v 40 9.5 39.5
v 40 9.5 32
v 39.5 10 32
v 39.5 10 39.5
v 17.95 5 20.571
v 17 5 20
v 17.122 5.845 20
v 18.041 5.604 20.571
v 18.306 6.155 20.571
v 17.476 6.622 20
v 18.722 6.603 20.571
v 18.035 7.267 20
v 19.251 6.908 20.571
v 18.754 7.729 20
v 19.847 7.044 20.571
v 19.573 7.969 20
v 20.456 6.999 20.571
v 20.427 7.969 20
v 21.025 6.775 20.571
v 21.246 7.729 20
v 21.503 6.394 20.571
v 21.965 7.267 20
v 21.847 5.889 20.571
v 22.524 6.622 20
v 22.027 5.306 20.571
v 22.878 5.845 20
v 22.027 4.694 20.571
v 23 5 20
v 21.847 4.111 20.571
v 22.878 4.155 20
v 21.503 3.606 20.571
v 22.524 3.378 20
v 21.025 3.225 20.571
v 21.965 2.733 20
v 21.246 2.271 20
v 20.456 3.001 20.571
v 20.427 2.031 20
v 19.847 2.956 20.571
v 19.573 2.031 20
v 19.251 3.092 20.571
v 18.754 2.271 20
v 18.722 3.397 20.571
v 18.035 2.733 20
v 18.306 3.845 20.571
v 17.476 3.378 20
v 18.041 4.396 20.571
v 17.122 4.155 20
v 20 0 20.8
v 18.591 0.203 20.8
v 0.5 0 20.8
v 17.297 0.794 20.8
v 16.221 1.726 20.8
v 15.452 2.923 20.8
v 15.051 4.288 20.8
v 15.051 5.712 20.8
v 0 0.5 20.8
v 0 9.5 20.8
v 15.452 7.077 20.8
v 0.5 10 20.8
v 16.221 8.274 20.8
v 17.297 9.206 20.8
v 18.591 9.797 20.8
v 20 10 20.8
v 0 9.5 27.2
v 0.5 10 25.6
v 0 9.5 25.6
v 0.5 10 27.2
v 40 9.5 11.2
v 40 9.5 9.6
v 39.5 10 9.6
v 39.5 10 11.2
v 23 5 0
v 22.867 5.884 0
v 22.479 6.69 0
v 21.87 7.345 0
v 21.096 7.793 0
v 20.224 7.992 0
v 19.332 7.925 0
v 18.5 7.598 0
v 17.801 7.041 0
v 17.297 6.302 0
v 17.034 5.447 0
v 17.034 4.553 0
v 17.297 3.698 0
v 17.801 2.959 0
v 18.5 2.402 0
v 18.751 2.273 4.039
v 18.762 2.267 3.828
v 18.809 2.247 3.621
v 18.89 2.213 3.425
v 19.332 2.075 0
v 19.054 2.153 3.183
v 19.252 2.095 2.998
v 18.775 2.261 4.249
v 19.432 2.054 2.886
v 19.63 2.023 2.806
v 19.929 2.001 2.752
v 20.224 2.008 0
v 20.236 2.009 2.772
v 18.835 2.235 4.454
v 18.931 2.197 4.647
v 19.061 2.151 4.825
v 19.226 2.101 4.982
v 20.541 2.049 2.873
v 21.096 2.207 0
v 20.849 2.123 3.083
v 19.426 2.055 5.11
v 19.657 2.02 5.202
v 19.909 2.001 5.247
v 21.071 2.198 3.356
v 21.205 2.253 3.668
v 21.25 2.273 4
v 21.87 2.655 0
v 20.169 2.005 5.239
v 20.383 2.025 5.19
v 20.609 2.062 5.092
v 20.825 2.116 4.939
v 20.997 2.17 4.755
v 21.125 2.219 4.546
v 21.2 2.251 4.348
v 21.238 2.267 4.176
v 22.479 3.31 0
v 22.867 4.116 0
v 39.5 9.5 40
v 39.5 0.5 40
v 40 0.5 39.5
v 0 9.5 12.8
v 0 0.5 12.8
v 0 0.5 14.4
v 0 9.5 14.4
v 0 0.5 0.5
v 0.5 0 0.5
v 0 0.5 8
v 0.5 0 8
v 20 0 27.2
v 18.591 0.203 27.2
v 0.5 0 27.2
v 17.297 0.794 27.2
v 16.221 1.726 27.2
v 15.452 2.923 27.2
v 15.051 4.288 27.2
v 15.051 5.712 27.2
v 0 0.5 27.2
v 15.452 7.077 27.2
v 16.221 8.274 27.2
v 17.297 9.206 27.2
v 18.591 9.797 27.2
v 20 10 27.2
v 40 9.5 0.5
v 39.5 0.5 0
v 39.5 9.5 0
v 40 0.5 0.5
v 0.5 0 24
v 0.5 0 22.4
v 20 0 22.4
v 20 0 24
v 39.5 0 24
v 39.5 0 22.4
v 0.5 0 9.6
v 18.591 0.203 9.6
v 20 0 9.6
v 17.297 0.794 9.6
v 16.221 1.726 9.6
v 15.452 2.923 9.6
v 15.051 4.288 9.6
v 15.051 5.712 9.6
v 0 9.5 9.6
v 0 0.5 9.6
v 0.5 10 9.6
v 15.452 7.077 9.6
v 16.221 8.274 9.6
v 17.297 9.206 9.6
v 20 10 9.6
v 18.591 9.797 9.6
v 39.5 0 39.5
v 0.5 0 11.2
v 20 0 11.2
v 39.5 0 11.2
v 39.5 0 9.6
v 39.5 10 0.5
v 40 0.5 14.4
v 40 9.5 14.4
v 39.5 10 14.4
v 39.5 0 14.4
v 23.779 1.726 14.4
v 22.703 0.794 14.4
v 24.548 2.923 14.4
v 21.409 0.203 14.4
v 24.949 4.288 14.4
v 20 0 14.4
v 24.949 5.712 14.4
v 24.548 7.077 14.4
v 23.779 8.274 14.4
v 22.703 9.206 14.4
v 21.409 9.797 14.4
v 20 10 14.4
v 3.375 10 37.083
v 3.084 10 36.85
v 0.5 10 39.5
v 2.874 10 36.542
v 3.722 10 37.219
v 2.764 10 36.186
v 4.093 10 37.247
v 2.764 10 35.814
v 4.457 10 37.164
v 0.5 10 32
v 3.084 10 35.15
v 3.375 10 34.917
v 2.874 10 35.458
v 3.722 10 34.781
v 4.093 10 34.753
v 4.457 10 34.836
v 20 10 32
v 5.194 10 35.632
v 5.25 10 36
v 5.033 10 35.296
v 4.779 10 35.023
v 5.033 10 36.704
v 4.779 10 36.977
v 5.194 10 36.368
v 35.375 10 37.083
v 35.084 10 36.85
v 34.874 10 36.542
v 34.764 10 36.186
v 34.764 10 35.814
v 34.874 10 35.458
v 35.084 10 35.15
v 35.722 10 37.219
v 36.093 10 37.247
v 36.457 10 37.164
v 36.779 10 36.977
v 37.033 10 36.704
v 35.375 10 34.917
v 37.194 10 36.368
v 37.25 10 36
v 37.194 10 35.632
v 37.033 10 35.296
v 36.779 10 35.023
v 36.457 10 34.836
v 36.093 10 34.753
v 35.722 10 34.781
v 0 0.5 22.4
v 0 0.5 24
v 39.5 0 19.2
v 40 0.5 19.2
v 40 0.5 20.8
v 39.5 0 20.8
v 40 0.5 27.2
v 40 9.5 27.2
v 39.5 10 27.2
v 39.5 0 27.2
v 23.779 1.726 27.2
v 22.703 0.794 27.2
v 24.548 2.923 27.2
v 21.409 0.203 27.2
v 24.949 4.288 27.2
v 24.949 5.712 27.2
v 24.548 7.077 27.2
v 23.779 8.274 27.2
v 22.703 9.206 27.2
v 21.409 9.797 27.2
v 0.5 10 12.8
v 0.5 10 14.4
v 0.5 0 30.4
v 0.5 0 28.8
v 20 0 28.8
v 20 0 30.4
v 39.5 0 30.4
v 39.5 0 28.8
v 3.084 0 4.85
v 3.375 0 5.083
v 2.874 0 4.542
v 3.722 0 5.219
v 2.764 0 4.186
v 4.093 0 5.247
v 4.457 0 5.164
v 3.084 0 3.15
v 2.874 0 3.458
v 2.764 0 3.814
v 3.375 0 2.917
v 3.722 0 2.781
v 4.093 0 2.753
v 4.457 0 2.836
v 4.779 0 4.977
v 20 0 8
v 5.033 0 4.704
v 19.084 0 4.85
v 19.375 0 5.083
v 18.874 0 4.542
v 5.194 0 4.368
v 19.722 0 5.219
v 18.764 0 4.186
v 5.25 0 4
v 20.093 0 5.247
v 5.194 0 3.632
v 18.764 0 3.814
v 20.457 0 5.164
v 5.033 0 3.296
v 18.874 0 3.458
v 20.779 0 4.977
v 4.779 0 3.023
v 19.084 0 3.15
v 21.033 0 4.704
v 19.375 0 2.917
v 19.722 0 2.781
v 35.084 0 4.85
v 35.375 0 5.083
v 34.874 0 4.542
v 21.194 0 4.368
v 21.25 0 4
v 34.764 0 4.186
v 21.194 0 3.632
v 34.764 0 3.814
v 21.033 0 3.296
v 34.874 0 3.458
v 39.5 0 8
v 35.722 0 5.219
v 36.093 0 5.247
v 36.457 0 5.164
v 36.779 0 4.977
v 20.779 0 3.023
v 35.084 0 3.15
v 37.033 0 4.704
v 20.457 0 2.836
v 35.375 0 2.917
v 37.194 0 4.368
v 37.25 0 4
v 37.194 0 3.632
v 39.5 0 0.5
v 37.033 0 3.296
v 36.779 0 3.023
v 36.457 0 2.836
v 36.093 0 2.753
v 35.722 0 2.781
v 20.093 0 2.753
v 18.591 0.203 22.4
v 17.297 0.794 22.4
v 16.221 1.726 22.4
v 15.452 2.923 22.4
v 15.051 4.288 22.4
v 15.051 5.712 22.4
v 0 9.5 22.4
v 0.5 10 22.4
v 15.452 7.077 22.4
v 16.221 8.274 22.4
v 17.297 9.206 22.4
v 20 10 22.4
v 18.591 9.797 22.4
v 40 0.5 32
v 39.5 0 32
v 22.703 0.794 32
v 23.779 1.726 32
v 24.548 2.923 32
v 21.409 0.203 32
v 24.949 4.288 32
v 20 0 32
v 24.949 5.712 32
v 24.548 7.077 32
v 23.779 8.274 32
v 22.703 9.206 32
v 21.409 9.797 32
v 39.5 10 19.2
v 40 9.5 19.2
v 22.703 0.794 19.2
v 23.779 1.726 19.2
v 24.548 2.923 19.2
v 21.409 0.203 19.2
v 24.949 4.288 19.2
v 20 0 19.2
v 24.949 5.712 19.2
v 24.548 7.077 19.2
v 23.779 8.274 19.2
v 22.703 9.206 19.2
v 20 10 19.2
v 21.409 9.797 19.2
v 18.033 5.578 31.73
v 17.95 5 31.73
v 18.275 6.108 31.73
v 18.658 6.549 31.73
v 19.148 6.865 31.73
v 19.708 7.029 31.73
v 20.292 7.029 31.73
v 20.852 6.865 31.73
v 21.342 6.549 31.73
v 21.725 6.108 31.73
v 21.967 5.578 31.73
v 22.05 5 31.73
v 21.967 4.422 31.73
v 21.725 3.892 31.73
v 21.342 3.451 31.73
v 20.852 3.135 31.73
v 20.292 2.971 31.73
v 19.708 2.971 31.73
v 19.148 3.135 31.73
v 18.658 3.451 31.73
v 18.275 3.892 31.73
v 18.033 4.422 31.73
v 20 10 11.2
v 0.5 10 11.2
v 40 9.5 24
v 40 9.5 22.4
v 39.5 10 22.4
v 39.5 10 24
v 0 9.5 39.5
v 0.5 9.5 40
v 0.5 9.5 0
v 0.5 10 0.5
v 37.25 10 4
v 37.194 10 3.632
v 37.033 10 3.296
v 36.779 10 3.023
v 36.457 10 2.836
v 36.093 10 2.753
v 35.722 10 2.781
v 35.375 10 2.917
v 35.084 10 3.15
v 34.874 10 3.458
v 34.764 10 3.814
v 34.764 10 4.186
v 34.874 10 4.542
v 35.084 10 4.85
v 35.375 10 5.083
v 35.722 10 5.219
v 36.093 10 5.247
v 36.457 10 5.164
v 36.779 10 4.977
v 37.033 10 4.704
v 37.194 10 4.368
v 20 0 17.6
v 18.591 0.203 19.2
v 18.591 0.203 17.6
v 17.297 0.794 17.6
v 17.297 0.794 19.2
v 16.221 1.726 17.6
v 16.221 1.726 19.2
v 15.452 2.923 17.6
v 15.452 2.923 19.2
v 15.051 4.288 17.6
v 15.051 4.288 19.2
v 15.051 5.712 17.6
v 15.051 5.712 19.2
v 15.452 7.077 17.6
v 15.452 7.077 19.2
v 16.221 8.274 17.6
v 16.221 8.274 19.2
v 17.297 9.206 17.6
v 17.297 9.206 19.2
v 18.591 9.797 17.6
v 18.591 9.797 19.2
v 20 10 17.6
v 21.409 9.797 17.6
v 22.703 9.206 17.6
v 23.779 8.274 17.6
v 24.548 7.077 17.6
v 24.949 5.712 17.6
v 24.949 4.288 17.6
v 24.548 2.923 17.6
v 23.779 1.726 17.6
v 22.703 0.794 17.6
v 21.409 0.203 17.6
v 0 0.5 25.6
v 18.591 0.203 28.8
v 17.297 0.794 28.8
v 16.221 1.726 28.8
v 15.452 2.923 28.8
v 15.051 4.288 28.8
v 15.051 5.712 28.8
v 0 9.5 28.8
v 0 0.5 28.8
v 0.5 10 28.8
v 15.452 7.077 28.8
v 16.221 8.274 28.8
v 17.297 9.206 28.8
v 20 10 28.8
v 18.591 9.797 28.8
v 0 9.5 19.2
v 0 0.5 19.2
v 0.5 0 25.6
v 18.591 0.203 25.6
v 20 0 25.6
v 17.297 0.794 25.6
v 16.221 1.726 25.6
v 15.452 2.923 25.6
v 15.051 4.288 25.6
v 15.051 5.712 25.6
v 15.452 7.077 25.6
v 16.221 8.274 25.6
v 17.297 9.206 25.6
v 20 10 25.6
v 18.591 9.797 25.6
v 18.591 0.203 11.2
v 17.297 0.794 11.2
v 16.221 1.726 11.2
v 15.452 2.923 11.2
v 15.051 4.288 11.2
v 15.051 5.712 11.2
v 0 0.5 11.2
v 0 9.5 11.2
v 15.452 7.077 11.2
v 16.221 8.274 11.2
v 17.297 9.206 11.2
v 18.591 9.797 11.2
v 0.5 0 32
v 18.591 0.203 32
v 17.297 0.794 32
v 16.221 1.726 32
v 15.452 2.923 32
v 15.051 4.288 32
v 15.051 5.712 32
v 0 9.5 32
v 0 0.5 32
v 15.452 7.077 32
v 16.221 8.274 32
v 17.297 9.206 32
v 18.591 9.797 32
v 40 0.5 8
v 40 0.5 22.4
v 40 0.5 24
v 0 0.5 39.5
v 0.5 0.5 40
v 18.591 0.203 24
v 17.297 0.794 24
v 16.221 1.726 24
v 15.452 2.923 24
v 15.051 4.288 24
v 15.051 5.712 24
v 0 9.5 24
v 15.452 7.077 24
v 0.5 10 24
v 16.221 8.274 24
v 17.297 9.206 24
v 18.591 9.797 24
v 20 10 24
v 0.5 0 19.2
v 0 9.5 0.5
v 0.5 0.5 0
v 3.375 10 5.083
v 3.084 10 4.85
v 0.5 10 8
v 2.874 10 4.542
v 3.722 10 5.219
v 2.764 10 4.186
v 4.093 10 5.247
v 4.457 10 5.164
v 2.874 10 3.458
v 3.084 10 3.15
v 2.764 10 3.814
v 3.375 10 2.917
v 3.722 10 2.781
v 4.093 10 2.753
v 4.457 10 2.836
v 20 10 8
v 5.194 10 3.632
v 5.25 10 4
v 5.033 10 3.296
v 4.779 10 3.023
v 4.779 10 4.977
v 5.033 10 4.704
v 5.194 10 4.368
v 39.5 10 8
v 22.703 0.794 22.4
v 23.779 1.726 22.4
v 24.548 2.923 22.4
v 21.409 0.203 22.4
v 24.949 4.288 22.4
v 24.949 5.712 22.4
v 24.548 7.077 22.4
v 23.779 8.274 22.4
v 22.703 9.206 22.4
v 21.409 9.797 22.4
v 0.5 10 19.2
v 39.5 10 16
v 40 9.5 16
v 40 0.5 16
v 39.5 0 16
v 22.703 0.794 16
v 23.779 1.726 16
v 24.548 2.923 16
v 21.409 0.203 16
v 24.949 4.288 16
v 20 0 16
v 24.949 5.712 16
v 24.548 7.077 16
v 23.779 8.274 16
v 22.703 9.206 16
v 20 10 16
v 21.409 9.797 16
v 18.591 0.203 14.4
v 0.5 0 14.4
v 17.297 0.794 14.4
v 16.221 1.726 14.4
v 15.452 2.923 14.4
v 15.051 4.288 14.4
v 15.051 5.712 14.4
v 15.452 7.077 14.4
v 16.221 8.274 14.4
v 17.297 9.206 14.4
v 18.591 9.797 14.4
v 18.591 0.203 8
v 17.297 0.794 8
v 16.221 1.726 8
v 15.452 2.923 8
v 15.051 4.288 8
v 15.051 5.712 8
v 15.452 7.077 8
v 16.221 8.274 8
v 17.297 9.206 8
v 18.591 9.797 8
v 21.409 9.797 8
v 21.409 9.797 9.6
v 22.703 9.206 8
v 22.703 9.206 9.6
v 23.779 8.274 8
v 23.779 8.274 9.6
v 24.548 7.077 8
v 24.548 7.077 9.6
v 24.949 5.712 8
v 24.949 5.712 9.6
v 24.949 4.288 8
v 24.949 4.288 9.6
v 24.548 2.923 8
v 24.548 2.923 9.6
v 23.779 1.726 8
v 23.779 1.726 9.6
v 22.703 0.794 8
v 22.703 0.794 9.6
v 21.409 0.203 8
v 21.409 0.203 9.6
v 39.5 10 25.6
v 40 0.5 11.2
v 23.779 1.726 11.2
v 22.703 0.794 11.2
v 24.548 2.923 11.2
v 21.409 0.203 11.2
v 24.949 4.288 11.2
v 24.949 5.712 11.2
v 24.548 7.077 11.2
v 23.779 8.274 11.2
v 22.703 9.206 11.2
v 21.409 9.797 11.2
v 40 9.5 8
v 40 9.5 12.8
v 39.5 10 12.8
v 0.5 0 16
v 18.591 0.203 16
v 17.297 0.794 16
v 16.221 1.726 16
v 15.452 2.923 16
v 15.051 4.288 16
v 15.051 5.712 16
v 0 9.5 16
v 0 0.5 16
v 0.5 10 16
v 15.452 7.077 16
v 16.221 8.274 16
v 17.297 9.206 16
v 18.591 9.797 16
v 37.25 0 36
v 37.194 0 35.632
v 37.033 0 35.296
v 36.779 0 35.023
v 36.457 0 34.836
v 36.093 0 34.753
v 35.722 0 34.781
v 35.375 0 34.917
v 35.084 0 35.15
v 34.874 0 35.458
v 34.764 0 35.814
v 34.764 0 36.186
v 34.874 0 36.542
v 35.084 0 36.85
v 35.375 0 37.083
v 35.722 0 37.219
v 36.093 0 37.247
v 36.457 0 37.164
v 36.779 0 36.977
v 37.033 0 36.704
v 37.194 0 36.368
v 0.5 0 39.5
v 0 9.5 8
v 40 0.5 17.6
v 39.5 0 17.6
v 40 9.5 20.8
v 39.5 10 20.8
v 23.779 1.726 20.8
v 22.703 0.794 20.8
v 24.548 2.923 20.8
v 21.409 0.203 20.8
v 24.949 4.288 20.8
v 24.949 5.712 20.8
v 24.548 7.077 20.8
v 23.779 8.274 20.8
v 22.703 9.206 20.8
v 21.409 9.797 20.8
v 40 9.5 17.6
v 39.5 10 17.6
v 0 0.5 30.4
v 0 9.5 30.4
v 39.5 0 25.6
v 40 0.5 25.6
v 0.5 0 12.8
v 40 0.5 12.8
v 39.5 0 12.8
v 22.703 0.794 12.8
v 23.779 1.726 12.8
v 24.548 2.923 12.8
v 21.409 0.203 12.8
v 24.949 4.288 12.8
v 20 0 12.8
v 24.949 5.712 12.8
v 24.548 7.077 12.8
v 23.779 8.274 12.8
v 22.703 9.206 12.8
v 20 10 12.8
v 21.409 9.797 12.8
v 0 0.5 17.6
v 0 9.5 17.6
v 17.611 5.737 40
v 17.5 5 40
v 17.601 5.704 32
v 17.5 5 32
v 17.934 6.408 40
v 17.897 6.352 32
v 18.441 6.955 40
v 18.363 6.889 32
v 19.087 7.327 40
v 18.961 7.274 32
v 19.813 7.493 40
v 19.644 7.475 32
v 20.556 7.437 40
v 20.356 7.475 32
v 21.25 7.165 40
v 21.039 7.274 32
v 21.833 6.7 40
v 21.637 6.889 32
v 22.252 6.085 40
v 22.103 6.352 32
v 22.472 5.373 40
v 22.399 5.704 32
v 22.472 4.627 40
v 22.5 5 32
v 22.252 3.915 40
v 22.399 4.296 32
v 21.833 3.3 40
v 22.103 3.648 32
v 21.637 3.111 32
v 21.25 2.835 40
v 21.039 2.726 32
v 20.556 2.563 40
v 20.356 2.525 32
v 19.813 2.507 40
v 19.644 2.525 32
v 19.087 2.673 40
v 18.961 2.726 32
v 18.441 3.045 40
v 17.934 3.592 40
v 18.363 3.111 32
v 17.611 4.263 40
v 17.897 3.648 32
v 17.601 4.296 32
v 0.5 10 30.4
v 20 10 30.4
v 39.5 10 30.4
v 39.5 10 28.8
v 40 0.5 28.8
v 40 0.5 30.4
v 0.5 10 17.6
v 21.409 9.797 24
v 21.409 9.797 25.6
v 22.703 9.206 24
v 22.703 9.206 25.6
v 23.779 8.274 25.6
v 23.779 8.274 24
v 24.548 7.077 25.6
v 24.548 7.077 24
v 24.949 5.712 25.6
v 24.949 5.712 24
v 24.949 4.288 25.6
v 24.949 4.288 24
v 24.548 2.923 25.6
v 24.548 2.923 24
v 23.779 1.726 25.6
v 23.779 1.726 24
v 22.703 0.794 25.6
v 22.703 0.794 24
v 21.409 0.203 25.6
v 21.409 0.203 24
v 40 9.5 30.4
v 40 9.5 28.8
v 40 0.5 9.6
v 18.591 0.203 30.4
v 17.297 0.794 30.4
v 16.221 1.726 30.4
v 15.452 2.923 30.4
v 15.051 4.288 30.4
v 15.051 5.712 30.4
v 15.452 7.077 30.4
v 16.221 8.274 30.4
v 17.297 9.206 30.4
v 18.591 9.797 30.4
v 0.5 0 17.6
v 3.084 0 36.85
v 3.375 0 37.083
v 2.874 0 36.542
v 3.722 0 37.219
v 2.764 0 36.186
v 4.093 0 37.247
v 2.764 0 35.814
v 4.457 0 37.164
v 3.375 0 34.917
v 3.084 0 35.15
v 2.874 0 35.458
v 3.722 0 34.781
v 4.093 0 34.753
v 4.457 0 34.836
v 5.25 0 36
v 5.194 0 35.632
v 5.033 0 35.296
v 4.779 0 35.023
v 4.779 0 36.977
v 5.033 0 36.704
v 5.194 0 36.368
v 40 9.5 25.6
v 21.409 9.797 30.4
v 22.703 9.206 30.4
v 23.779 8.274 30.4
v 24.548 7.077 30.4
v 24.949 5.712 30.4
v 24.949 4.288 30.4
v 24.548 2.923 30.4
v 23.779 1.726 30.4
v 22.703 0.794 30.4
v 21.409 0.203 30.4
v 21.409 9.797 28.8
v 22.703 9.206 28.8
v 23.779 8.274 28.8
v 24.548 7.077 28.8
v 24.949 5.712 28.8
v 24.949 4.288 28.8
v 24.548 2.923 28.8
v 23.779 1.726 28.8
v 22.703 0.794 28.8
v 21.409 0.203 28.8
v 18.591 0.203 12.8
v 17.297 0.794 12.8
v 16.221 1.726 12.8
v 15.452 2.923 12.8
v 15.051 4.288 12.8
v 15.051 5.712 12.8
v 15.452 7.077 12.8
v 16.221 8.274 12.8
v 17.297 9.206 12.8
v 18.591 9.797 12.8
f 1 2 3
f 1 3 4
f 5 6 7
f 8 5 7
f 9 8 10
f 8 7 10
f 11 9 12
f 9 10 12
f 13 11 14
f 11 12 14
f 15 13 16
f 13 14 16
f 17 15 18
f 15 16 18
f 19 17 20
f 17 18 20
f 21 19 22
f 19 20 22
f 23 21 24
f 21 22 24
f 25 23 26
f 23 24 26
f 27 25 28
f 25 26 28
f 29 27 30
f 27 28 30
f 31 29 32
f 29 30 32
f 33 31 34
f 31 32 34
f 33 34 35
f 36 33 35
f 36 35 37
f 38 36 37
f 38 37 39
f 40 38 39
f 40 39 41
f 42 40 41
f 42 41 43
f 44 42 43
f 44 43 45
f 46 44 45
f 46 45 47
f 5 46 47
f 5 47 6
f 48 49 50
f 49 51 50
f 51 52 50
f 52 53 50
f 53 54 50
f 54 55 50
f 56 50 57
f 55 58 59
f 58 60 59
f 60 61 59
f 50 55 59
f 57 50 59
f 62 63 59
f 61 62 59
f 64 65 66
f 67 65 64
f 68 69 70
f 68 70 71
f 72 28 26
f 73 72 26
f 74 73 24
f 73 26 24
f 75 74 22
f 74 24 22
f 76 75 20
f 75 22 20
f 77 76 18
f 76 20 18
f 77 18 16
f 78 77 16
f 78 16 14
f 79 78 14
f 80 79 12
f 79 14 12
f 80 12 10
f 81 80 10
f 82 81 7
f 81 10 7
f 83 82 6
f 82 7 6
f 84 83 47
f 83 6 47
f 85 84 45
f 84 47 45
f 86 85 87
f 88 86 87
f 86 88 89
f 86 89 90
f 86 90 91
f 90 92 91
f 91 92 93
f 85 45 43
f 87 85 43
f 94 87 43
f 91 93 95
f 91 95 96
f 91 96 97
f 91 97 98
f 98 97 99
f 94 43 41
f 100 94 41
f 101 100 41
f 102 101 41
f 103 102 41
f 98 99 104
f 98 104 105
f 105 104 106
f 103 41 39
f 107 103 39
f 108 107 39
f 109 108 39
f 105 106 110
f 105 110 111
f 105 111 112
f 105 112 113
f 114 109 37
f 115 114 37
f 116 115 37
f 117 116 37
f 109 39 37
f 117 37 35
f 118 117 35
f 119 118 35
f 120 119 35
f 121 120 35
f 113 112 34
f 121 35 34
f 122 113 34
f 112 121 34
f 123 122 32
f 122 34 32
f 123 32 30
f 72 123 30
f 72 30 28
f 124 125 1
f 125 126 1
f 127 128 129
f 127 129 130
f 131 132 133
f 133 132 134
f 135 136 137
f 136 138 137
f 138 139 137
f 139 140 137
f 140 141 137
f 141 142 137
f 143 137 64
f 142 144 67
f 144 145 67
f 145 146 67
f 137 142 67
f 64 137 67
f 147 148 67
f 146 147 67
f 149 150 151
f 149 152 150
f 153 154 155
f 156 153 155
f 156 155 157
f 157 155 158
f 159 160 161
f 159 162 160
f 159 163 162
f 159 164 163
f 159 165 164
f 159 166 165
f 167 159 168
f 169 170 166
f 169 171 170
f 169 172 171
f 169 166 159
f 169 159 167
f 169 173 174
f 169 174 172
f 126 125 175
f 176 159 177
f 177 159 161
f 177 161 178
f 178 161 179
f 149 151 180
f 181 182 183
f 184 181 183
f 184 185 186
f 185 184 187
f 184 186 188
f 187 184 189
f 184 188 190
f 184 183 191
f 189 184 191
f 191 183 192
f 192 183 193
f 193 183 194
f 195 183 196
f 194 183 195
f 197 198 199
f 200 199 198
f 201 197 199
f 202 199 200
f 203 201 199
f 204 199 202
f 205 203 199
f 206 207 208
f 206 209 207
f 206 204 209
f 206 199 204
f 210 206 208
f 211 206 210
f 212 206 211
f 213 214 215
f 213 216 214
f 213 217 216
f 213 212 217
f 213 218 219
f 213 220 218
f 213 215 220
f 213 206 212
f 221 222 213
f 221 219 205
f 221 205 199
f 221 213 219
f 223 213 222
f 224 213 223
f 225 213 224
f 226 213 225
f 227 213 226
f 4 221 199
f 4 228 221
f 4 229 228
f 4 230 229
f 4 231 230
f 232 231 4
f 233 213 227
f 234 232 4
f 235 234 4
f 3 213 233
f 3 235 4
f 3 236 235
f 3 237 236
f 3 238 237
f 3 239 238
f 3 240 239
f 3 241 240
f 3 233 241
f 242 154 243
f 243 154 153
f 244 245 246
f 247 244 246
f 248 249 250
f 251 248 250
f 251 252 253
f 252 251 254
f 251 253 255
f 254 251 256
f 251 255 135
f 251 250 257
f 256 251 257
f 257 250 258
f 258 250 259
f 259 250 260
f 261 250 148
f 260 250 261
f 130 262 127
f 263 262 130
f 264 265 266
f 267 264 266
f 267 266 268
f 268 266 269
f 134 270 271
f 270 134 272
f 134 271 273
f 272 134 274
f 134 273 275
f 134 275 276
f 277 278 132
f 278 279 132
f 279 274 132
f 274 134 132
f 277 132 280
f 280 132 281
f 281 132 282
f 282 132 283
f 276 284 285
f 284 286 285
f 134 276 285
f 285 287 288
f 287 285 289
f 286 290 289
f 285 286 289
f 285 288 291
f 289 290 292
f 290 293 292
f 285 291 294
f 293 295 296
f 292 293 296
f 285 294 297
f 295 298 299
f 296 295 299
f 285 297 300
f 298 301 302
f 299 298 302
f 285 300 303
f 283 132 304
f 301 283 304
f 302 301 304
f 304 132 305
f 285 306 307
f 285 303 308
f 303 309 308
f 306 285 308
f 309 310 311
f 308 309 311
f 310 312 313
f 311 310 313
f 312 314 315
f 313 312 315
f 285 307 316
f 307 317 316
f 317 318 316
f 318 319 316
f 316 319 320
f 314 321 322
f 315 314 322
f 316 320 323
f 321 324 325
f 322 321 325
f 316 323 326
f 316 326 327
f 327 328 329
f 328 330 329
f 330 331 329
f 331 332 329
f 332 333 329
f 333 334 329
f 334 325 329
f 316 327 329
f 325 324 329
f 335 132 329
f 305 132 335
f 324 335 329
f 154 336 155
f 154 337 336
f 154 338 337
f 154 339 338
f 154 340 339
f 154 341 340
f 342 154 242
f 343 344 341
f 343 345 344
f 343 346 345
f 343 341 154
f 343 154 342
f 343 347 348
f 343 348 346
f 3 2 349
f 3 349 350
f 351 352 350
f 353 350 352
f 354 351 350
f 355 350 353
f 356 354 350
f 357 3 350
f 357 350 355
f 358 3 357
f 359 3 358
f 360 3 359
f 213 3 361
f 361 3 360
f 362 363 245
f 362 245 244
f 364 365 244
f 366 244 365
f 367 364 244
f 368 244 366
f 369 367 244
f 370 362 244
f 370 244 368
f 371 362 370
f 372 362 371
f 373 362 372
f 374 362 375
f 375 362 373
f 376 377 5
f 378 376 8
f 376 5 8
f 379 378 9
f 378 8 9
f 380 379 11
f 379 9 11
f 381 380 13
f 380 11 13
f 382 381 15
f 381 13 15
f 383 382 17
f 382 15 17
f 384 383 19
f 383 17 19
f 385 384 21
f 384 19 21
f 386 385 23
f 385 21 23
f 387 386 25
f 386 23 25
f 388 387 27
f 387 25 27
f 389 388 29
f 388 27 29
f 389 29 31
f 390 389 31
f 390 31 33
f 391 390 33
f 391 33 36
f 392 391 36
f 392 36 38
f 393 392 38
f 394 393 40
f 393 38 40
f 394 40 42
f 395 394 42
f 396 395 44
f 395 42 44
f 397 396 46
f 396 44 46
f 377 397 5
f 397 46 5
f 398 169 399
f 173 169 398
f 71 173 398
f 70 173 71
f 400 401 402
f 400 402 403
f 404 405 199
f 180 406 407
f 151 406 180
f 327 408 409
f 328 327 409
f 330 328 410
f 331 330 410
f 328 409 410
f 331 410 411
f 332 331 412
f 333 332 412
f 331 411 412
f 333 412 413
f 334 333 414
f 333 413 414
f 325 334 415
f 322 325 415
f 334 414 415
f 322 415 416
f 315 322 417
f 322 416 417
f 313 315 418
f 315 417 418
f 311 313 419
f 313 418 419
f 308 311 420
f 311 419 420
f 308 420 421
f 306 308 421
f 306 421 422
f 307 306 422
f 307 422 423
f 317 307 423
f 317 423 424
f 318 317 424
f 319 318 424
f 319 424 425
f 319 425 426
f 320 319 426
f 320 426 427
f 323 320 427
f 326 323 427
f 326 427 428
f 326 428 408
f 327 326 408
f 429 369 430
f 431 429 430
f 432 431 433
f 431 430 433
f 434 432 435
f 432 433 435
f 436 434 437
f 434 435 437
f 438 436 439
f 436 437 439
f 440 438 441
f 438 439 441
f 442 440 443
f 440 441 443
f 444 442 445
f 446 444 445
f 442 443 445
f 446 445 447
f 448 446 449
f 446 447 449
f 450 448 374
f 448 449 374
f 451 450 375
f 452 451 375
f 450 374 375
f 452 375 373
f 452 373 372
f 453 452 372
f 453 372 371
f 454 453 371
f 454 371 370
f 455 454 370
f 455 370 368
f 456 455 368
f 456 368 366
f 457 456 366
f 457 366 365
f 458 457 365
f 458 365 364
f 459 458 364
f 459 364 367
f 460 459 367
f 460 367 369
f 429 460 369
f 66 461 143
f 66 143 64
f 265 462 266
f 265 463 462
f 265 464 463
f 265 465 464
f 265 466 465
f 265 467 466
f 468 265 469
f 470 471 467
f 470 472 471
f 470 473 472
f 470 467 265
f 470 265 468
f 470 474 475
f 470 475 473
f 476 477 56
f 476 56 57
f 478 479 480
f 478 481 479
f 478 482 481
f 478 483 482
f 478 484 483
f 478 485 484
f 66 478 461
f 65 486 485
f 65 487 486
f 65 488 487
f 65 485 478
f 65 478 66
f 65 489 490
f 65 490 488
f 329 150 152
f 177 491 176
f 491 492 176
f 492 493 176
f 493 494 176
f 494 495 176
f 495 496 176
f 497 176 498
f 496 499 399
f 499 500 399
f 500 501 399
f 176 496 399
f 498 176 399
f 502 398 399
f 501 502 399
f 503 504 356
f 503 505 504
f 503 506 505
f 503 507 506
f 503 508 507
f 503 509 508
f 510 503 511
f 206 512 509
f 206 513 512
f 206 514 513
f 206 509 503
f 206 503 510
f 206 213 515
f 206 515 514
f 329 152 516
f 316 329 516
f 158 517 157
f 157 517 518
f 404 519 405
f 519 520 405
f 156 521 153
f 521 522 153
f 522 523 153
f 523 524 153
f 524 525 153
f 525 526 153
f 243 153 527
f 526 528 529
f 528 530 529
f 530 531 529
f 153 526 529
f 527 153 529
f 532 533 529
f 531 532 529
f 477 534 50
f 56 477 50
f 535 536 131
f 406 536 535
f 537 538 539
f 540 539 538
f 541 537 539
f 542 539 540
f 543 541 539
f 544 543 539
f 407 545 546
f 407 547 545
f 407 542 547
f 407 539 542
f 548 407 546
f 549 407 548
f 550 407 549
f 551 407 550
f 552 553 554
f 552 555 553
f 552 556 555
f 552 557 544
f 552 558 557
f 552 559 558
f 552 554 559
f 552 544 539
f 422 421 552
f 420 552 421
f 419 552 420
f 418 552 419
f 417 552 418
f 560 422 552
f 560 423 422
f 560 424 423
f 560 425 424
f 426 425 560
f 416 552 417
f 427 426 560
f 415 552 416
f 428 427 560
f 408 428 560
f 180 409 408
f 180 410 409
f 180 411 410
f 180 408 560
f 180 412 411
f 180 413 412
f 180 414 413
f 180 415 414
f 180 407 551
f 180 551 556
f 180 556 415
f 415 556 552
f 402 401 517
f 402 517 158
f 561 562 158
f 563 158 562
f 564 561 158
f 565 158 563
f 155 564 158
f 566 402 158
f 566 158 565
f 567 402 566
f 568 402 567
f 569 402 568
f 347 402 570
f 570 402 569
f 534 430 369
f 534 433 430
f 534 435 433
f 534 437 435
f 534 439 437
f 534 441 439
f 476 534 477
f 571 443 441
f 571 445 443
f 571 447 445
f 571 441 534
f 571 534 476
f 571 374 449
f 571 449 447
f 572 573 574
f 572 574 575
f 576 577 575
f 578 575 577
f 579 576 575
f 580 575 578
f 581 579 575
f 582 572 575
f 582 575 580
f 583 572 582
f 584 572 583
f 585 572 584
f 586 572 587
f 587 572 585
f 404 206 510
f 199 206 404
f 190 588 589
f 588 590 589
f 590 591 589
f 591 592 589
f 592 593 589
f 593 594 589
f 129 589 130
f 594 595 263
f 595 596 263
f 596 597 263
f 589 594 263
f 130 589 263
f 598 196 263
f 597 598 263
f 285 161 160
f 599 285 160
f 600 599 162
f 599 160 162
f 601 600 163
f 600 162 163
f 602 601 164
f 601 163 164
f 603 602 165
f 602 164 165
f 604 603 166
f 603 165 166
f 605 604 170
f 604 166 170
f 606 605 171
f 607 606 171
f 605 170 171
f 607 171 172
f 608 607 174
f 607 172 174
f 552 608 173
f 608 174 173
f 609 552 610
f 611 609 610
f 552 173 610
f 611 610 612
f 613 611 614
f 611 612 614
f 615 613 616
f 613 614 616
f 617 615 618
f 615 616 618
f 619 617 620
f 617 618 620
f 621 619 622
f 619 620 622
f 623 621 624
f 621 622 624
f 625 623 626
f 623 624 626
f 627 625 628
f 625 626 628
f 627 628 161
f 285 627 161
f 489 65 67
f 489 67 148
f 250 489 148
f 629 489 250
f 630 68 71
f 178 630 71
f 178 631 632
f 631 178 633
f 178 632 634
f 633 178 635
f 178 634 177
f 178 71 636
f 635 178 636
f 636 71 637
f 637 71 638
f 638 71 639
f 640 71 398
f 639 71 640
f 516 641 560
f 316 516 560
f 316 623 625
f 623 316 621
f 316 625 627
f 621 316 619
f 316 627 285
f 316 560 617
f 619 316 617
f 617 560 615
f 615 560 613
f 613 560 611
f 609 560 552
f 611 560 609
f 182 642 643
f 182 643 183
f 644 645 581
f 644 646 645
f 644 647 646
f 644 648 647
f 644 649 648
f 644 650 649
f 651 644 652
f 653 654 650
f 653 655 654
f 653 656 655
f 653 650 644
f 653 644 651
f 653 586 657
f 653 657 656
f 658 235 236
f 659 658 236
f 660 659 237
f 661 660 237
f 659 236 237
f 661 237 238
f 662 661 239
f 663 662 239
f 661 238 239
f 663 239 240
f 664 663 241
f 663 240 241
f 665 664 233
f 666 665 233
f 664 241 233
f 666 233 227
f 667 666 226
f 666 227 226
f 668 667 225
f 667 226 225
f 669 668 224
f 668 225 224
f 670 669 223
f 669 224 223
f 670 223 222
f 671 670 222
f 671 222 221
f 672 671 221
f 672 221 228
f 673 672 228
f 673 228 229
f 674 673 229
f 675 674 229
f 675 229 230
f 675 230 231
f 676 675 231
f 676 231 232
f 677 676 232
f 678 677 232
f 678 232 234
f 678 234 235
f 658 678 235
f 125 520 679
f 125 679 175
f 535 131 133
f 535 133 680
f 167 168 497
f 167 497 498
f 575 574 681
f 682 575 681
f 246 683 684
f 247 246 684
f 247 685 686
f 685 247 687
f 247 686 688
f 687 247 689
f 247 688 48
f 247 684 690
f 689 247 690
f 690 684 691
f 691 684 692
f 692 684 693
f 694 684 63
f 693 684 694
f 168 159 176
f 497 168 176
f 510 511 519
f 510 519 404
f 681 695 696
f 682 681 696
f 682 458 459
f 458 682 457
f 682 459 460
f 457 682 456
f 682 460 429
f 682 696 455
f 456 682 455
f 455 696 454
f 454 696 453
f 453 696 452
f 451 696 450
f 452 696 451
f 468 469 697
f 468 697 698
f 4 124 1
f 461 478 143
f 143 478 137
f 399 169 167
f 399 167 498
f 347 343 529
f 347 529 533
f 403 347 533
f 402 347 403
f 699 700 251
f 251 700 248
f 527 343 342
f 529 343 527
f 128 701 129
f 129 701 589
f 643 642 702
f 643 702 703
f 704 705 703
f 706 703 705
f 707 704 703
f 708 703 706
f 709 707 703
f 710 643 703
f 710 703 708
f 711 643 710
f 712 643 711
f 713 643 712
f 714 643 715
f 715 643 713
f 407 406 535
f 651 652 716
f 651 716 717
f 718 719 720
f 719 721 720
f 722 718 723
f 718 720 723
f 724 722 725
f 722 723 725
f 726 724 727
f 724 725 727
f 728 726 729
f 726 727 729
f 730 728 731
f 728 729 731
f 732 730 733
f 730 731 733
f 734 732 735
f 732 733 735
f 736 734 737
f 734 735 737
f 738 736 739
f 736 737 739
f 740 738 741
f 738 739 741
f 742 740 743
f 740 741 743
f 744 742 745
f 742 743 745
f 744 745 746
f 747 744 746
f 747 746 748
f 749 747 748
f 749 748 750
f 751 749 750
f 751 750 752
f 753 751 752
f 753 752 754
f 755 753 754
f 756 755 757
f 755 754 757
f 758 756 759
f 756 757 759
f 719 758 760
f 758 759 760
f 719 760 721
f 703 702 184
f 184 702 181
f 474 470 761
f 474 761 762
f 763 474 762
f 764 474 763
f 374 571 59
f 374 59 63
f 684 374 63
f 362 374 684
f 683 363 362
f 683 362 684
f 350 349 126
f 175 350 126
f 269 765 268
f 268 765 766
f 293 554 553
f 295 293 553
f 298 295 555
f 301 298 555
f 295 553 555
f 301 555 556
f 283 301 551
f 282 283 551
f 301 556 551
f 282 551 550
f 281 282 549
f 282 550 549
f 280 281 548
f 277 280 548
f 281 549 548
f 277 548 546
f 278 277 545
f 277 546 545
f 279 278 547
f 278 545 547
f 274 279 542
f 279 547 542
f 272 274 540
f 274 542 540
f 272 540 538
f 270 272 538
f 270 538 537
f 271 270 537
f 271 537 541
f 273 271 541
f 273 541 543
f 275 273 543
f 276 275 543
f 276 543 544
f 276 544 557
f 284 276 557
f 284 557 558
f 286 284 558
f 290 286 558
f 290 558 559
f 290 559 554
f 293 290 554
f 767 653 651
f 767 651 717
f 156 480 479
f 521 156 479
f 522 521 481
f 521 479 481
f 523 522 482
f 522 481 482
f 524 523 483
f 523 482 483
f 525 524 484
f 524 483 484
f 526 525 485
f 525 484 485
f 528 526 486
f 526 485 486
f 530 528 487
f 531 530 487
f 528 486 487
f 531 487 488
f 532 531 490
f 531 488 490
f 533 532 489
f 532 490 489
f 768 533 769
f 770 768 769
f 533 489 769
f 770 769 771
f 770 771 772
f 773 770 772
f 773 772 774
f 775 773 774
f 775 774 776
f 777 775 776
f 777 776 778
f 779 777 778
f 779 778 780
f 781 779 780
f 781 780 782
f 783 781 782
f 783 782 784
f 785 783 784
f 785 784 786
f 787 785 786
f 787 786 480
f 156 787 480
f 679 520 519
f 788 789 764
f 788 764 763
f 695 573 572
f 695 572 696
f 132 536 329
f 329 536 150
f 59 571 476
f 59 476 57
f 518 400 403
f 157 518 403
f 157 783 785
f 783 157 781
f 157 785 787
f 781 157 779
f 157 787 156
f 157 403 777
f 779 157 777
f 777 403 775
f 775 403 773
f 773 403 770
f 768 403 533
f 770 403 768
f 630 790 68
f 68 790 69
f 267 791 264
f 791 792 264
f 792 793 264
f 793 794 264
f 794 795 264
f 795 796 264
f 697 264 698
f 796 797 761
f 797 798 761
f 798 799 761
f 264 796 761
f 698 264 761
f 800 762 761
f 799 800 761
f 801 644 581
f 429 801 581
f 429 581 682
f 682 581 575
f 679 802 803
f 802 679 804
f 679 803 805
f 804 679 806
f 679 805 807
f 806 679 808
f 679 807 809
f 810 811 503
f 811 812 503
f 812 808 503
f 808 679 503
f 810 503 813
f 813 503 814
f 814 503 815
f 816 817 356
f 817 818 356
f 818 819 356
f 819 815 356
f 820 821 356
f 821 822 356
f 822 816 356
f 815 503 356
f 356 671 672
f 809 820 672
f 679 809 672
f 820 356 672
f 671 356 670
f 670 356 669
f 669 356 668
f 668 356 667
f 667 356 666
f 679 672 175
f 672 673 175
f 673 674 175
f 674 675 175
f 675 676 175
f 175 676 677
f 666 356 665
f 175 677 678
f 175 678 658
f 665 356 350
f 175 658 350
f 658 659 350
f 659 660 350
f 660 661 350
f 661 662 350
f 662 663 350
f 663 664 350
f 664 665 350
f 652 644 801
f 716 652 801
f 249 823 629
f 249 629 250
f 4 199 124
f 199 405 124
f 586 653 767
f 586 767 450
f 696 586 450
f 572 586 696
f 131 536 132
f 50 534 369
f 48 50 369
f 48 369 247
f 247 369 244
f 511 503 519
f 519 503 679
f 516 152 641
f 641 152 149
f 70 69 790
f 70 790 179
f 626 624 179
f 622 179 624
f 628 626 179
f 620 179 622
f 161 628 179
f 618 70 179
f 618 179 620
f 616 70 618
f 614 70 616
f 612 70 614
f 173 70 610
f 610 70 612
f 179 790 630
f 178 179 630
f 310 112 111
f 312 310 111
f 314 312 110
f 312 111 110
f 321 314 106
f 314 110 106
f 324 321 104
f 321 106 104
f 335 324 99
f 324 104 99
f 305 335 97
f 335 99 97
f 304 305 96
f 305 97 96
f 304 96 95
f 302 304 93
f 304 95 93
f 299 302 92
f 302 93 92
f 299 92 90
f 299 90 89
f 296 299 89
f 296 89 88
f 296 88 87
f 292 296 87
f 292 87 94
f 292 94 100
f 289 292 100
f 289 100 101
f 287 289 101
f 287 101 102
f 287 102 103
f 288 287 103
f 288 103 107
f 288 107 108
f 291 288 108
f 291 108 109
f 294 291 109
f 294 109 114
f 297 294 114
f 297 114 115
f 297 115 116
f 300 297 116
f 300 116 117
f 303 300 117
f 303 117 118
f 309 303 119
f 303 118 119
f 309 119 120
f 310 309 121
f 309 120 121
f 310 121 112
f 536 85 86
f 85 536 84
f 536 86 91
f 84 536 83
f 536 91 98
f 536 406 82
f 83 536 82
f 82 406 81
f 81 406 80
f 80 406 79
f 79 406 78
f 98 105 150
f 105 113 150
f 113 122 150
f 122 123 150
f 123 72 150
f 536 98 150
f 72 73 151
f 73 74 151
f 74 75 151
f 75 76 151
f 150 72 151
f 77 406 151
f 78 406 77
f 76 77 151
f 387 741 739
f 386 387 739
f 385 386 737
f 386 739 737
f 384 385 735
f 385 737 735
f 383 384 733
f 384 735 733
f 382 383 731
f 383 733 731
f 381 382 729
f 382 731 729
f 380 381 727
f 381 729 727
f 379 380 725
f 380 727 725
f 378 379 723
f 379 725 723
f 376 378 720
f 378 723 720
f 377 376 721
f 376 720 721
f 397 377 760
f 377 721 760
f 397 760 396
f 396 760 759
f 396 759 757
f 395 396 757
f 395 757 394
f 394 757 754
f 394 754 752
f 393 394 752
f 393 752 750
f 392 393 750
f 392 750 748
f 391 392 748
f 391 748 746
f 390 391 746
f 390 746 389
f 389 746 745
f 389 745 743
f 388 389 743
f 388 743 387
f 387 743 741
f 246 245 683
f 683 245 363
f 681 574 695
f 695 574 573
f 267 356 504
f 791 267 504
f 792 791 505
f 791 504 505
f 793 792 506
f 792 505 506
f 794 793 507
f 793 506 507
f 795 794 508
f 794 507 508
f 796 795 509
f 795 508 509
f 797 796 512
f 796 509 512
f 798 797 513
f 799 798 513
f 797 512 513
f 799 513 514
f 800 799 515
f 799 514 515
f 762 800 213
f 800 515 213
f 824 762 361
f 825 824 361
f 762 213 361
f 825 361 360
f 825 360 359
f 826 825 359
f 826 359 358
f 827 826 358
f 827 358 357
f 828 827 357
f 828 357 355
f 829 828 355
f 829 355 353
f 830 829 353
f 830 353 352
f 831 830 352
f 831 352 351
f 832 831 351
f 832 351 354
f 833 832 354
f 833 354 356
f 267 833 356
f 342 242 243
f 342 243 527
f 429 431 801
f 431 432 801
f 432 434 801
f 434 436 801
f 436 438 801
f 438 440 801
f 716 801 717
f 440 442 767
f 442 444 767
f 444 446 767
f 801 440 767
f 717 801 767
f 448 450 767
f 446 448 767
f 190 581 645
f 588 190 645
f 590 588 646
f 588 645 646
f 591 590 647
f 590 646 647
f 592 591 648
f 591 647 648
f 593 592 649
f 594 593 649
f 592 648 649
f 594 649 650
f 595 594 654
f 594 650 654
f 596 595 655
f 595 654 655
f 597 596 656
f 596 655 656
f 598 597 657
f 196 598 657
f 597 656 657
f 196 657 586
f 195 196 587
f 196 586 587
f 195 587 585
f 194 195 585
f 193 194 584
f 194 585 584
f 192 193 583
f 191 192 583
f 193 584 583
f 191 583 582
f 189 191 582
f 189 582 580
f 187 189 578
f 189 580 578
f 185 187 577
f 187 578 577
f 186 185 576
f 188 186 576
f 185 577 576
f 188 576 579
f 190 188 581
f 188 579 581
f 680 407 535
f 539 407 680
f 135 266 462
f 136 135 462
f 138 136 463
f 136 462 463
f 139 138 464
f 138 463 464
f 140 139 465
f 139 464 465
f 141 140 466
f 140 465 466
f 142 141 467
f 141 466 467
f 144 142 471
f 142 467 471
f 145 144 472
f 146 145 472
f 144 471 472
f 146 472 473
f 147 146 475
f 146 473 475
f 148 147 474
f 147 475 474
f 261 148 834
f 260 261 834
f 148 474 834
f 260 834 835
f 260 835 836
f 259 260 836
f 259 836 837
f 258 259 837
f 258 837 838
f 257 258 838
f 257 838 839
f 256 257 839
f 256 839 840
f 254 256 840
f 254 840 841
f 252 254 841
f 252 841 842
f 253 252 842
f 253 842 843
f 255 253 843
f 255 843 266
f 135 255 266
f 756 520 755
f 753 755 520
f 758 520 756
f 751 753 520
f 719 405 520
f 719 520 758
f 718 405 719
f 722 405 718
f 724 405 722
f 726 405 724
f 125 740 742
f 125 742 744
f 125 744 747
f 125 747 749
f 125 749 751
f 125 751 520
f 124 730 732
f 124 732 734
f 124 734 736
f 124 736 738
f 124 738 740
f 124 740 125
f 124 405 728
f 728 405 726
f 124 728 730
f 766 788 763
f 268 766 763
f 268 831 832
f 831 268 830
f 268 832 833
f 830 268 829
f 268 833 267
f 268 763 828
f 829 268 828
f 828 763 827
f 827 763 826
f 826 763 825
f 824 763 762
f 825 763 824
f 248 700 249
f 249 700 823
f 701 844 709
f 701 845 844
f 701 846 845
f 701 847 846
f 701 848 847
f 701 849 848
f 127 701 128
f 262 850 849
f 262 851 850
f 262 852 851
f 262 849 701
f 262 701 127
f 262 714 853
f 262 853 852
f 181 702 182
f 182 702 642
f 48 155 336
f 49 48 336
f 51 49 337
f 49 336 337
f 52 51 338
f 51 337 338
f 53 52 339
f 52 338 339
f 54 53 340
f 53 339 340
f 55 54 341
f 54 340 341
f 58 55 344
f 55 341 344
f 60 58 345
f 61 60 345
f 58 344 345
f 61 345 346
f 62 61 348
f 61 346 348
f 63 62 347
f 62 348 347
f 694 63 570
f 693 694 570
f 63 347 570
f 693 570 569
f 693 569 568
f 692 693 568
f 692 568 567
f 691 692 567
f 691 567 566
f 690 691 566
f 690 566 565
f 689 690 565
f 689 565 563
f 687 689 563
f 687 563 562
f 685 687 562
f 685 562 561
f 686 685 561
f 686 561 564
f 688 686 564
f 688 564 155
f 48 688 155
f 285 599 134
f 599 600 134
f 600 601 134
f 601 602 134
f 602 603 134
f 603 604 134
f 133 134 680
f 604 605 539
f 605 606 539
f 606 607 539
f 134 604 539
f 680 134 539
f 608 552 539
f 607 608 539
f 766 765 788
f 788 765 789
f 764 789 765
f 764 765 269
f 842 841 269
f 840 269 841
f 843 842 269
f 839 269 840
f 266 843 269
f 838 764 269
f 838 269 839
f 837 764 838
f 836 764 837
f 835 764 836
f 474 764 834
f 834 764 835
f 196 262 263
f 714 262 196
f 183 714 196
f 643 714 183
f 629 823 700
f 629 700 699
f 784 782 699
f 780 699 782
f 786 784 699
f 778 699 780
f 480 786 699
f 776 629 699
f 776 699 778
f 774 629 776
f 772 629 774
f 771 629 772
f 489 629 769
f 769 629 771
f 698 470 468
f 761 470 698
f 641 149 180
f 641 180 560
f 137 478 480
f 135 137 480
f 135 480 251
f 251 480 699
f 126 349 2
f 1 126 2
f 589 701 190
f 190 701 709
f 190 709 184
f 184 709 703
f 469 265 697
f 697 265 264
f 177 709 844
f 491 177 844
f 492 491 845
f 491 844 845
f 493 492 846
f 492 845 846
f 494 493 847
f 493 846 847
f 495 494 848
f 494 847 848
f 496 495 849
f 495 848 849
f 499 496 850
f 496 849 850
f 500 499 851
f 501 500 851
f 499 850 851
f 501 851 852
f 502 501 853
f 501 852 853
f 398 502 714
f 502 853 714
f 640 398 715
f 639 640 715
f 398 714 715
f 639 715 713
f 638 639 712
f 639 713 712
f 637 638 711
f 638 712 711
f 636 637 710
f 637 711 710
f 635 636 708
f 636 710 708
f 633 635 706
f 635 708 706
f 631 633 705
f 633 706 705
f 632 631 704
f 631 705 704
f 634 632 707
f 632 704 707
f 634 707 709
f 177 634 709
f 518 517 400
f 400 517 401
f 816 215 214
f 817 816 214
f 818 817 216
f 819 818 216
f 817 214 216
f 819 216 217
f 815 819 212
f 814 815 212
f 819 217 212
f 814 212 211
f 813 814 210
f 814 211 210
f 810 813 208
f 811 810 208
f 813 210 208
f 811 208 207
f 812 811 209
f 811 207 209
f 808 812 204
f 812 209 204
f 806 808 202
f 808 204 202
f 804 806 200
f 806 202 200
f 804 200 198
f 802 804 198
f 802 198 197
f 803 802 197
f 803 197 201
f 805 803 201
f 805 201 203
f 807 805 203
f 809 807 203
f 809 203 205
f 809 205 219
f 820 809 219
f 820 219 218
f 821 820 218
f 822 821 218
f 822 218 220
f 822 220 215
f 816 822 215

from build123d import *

# Parameters (mm, degrees)
ESQUISSE2_W                                   = 40
ESQUISSE2_H                                   = 10
BOSS_EXTRU_1_DEPTH                            = 40
DIAM_TRE_DU_PER_AGE_4_1_4_1_1_D               = 4.1
TROU_POUR_TARAUDAGE_POUR_TROU_TARAUD_M6_D     = 5
TROU_POUR_TARAUDAGE_POUR_TROU_TARAUD_M6_DEPTH = 8
TROU_POUR_TARAUDAGE_POUR_TROU_TARAUD_M6_TIP   = 1.502151548
DIAM_TRE_DU_PER_AGE_6_0_6_1_D                 = 6
DIAM_TRE_DU_PER_AGE_6_0_6_1_DEPTH             = 20
DIAM_TRE_DU_PER_AGE_6_0_6_1_TIP               = 1.802581857
TROU_POUR_TARAUDAGE_POUR_TROU_TARAUD_M3_D     = 2.5
TROU_POUR_TARAUDAGE_POUR_TROU_TARAUD_2_D      = 2.5
TROU_POUR_TARAUDAGE_POUR_TROU_TARAUD_2_DEPTH  = 5
TROU_POUR_TARAUDAGE_POUR_TROU_TARAUD_2_TIP    = 0.751075774
CHANFREIN1_SIZE                               = 0.5
ENL_V_START                                   = 8
ESQUISSE20_R                                  = 26.193290648
ESQUISSE20_R_2                                = 5
ENL_V_MAT_EXTRU_1_DEPTH                       = 1.6
R_P_TITION_LIN_AIRE1_COUNT                    = 8
R_P_TITION_LIN_AIRE1_PITCH                    = 3.2


with BuildPart() as part:
    # Esquisse2 → Boss.-Extru.1 (new body)
    with BuildSketch(Plane.XY):
        with Locations((20, 5)):
            Rectangle(ESQUISSE2_W, ESQUISSE2_H)
    extrude(amount=BOSS_EXTRU_1_DEPTH)

    # Diamètre du perçage Ø4.1 (4.1)1 (through all)
    with Locations(Plane.XY.offset(40)):
        with Locations((20, 5)):
            Hole(DIAM_TRE_DU_PER_AGE_4_1_4_1_1_D / 2)

    # Trou pour taraudage pour trou taraudé M61
    with Locations(Plane.XY.offset(40)):
        with Locations((20, 5)):
            Hole(TROU_POUR_TARAUDAGE_POUR_TROU_TARAUD_M6_D / 2, depth=TROU_POUR_TARAUDAGE_POUR_TROU_TARAUD_M6_DEPTH)
            with Locations((0, 0, -(TROU_POUR_TARAUDAGE_POUR_TROU_TARAUD_M6_DEPTH + TROU_POUR_TARAUDAGE_POUR_TROU_TARAUD_M6_TIP / 2))):  # 118° drill point
                Cone(0, TROU_POUR_TARAUDAGE_POUR_TROU_TARAUD_M6_D / 2, TROU_POUR_TARAUDAGE_POUR_TROU_TARAUD_M6_TIP, mode=Mode.SUBTRACT)

    # Diamètre du perçage Ø6.0 (6)1
    with Locations(Plane(origin=(0, 0, 0), x_dir=(-1, 0, 0), z_dir=(0, 0, -1))):
        with Locations((-20, 5)):
            Hole(DIAM_TRE_DU_PER_AGE_6_0_6_1_D / 2, depth=DIAM_TRE_DU_PER_AGE_6_0_6_1_DEPTH)
            with Locations((0, 0, -(DIAM_TRE_DU_PER_AGE_6_0_6_1_DEPTH + DIAM_TRE_DU_PER_AGE_6_0_6_1_TIP / 2))):  # 118° drill point
                Cone(0, DIAM_TRE_DU_PER_AGE_6_0_6_1_D / 2, DIAM_TRE_DU_PER_AGE_6_0_6_1_TIP, mode=Mode.SUBTRACT)

    # Trou pour taraudage pour trou taraud_ M3 (through all)
    with Locations(Plane(origin=(0, 0, 0), x_dir=(-1, 0, 0), z_dir=(0, -1, 0))):
        with Locations((-4, -36), (-36, -36), (-36, -4), (-4, -4)):
            Hole(TROU_POUR_TARAUDAGE_POUR_TROU_TARAUD_M3_D / 2)

    # Trou pour taraudage pour trou taraud 2
    with Locations(Plane(origin=(0, 0, 0), x_dir=(-1, 0, 0), z_dir=(0, -1, 0))):
        with Locations((-20, -4)):
            Hole(TROU_POUR_TARAUDAGE_POUR_TROU_TARAUD_2_D / 2, depth=TROU_POUR_TARAUDAGE_POUR_TROU_TARAUD_2_DEPTH)
            with Locations((0, 0, -(TROU_POUR_TARAUDAGE_POUR_TROU_TARAUD_2_DEPTH + TROU_POUR_TARAUDAGE_POUR_TROU_TARAUD_2_TIP / 2))):  # 118° drill point
                Cone(0, TROU_POUR_TARAUDAGE_POUR_TROU_TARAUD_2_D / 2, TROU_POUR_TARAUDAGE_POUR_TROU_TARAUD_2_TIP, mode=Mode.SUBTRACT)

    # Chanfrein1
    chanfrein1_edges = [part.edges().sort_by_distance(p)[0] for p in [
        (40, 5, 0),
        (20, 10, 0),
        (0, 5, 0),
        (20, 0, 0),
        (40, 10, 20),
        (40, 0, 20),
        (0, 10, 20),
        (0, 0, 20),
        (0, 5, 40),
        (20, 10, 40),
        (40, 5, 40),
        (20, 0, 40),
    ]]
    chamfer(chanfrein1_edges, length=CHANFREIN1_SIZE)

    # Esquisse20 → Enlèv. mat.-Extru.1 (cut)
    with BuildSketch(Plane(origin=(0, 40, 40), x_dir=(-1, 0, 0), z_dir=(0, 0, -1)).offset(ENL_V_START)):
        with Locations((-20, -35)):
            Circle(ESQUISSE20_R)
        with Locations((-20, -35)):
            Circle(ESQUISSE20_R_2, mode=Mode.SUBTRACT)
    enl_v_mat_extru_1 = extrude(amount=ENL_V_MAT_EXTRU_1_DEPTH, mode=Mode.SUBTRACT)

    # Répétition linéaire1: Enlèv. mat.-Extru.1 ×8
    with Locations(*[(0, 0, -i * R_P_TITION_LIN_AIRE1_PITCH) for i in range(1, R_P_TITION_LIN_AIRE1_COUNT)]):
        add(enl_v_mat_extru_1, mode=Mode.SUBTRACT)


solid = part.part
